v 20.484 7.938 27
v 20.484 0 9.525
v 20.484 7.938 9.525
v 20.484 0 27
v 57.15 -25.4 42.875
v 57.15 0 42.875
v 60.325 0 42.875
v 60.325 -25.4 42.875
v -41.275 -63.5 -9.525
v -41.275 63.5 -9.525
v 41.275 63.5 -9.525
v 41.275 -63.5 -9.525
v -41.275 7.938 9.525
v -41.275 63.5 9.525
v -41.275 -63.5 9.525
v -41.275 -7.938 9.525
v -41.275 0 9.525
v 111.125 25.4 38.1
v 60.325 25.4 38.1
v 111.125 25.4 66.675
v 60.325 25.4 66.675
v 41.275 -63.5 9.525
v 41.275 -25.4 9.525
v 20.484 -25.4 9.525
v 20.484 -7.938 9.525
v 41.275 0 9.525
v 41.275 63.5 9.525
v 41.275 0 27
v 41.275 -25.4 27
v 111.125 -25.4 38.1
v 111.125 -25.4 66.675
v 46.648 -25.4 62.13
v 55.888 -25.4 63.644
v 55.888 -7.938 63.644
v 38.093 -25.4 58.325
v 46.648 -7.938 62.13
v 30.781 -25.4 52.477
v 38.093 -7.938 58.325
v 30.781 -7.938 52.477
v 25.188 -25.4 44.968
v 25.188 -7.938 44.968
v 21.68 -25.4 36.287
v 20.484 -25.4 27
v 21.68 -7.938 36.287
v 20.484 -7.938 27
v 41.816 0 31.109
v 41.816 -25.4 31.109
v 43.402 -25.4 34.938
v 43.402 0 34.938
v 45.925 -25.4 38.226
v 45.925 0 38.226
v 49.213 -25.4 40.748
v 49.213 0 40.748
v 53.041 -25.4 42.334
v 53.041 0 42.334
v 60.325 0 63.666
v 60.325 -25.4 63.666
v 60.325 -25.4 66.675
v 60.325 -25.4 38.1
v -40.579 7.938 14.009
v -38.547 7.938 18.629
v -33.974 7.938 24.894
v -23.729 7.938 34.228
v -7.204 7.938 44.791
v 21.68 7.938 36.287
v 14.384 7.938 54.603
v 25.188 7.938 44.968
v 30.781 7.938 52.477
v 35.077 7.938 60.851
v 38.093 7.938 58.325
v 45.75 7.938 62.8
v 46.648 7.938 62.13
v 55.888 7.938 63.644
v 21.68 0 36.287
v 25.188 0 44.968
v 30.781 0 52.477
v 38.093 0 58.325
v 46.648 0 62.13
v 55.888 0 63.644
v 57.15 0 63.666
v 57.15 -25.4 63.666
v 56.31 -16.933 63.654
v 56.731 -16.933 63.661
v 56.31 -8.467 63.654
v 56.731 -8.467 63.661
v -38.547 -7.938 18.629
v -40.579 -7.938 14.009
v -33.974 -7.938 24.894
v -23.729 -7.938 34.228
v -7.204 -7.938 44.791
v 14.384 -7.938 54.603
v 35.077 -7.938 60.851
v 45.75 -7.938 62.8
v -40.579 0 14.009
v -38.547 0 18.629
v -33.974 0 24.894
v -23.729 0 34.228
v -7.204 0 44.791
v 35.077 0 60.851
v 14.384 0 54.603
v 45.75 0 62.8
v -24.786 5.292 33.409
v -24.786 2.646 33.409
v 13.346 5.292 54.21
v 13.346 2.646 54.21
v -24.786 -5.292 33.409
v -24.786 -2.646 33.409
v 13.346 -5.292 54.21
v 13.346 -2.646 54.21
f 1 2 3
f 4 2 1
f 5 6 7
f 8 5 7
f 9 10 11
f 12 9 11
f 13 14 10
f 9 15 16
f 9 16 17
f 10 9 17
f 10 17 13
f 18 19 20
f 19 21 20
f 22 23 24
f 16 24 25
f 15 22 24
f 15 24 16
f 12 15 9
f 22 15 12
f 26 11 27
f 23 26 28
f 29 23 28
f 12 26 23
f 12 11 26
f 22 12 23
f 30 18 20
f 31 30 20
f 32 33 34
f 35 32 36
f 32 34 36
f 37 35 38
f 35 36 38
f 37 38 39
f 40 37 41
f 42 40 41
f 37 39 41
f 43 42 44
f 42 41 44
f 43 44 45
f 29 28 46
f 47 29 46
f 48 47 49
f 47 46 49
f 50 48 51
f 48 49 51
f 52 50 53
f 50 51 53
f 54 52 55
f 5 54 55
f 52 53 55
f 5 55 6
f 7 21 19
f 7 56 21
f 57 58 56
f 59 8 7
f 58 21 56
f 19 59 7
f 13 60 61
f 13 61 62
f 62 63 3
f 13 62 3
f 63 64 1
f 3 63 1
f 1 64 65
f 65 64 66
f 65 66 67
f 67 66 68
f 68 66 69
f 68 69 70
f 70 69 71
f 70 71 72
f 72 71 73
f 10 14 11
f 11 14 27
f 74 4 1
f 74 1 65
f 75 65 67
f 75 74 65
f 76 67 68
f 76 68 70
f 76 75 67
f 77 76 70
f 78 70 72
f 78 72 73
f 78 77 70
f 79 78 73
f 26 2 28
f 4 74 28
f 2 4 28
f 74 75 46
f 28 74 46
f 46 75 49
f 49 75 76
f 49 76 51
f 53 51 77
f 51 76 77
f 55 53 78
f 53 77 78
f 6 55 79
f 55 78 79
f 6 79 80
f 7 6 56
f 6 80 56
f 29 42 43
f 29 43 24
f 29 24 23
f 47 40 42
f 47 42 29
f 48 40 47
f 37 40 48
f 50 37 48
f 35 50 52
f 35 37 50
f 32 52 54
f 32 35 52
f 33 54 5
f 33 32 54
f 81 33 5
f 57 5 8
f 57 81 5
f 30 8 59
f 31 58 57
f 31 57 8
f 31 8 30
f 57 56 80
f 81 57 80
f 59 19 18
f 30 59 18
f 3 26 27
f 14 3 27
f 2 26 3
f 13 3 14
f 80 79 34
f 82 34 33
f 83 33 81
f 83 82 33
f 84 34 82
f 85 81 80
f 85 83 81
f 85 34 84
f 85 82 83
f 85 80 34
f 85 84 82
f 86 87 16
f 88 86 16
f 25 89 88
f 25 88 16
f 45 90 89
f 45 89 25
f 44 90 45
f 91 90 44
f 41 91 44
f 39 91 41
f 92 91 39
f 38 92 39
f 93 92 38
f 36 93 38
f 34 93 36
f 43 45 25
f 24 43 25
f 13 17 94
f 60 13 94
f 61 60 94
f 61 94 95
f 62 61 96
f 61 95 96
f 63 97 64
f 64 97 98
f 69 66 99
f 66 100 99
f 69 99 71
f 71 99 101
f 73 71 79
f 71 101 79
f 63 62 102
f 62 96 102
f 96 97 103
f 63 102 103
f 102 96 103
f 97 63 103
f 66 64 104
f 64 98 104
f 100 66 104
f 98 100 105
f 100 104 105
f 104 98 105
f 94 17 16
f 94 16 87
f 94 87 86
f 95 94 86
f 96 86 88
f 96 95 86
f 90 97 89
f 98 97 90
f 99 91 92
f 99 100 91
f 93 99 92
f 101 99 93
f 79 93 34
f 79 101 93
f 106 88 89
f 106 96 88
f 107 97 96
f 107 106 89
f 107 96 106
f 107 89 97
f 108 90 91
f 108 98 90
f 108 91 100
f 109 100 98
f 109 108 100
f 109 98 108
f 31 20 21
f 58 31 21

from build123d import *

# Parameters (mm, degrees)
F1_DEPTH = 63.5
F2_DEPTH = 25.4
F3_DEPTH = 7.9375
F4_DEPTH = 25.4


with BuildPart() as f1:
    # F0 (on Front) → F1 (new body, symmetric)
    with BuildSketch(Plane.XZ):
        Polygon((41.275, -9.525), (41.275, 9.525), (20.484332, 9.525), (-41.275, 9.525), (-41.275, -9.525), align=None)
    extrude(amount=F1_DEPTH, both=True)

    # F0 (on Front) → F2 (join)
    with BuildSketch(Plane.XZ):
        with BuildLine():
            Line((20.484332, 9.525), (41.275, 9.525))
            Line((41.275, 9.525), (41.275, 27.0002))
            ThreePointArc((41.275, 27.0002), (45.92468, 38.22552), (57.15, 42.8752))
            Line((57.15, 42.8752), (60.325, 42.8752))
            Line((60.325, 42.8752), (60.325, 63.665868))
            Line((60.325, 63.665868), (57.15, 63.665868))
            add(Edge.make_bspline(
                [(55.888309, 63.644154), (56.311167, 63.654873), (56.731763, 63.662127), (57.15, 63.665868)],
                knots=[111.128232, 111.128232, 111.128232, 111.128232, 112.33305, 112.33305, 112.33305, 112.33305], degree=3))
            ThreePointArc((55.888309, 63.644154), (30.781155, 52.476763), (20.484332, 27.0002))
            Line((20.484332, 27.0002), (20.484332, 9.525))
        make_face()
    extrude(amount=F2_DEPTH)

    # F0 (on Front) → F3 (join, symmetric)
    with BuildSketch(Plane.XZ):
        with BuildLine():
            Line((-41.275, 9.525), (20.484332, 9.525))
            Line((20.484332, 9.525), (20.484332, 27.0002))
            ThreePointArc((20.484332, 27.0002), (30.781155, 52.476763), (55.888309, 63.644154))
            add(Edge.make_bspline(
                [(-41.275, 9.525), (-41.352221, 32.188205), (16.885422, 62.65548), (55.888309, 63.644154)],
                knots=[0, 0, 0, 0, 111.128232, 111.128232, 111.128232, 111.128232], degree=3))
        make_face()
    extrude(amount=F3_DEPTH, both=True)

    # F0 (on Front) → F4 (join, symmetric)
    with BuildSketch(Plane.XZ):
        Polygon((60.325, 63.665868), (60.325, 42.8752), (60.325, 38.1), (111.125, 38.1), (111.125, 66.675), (60.325, 66.675), align=None)
    extrude(amount=F4_DEPTH, both=True)


solid = f1.part
